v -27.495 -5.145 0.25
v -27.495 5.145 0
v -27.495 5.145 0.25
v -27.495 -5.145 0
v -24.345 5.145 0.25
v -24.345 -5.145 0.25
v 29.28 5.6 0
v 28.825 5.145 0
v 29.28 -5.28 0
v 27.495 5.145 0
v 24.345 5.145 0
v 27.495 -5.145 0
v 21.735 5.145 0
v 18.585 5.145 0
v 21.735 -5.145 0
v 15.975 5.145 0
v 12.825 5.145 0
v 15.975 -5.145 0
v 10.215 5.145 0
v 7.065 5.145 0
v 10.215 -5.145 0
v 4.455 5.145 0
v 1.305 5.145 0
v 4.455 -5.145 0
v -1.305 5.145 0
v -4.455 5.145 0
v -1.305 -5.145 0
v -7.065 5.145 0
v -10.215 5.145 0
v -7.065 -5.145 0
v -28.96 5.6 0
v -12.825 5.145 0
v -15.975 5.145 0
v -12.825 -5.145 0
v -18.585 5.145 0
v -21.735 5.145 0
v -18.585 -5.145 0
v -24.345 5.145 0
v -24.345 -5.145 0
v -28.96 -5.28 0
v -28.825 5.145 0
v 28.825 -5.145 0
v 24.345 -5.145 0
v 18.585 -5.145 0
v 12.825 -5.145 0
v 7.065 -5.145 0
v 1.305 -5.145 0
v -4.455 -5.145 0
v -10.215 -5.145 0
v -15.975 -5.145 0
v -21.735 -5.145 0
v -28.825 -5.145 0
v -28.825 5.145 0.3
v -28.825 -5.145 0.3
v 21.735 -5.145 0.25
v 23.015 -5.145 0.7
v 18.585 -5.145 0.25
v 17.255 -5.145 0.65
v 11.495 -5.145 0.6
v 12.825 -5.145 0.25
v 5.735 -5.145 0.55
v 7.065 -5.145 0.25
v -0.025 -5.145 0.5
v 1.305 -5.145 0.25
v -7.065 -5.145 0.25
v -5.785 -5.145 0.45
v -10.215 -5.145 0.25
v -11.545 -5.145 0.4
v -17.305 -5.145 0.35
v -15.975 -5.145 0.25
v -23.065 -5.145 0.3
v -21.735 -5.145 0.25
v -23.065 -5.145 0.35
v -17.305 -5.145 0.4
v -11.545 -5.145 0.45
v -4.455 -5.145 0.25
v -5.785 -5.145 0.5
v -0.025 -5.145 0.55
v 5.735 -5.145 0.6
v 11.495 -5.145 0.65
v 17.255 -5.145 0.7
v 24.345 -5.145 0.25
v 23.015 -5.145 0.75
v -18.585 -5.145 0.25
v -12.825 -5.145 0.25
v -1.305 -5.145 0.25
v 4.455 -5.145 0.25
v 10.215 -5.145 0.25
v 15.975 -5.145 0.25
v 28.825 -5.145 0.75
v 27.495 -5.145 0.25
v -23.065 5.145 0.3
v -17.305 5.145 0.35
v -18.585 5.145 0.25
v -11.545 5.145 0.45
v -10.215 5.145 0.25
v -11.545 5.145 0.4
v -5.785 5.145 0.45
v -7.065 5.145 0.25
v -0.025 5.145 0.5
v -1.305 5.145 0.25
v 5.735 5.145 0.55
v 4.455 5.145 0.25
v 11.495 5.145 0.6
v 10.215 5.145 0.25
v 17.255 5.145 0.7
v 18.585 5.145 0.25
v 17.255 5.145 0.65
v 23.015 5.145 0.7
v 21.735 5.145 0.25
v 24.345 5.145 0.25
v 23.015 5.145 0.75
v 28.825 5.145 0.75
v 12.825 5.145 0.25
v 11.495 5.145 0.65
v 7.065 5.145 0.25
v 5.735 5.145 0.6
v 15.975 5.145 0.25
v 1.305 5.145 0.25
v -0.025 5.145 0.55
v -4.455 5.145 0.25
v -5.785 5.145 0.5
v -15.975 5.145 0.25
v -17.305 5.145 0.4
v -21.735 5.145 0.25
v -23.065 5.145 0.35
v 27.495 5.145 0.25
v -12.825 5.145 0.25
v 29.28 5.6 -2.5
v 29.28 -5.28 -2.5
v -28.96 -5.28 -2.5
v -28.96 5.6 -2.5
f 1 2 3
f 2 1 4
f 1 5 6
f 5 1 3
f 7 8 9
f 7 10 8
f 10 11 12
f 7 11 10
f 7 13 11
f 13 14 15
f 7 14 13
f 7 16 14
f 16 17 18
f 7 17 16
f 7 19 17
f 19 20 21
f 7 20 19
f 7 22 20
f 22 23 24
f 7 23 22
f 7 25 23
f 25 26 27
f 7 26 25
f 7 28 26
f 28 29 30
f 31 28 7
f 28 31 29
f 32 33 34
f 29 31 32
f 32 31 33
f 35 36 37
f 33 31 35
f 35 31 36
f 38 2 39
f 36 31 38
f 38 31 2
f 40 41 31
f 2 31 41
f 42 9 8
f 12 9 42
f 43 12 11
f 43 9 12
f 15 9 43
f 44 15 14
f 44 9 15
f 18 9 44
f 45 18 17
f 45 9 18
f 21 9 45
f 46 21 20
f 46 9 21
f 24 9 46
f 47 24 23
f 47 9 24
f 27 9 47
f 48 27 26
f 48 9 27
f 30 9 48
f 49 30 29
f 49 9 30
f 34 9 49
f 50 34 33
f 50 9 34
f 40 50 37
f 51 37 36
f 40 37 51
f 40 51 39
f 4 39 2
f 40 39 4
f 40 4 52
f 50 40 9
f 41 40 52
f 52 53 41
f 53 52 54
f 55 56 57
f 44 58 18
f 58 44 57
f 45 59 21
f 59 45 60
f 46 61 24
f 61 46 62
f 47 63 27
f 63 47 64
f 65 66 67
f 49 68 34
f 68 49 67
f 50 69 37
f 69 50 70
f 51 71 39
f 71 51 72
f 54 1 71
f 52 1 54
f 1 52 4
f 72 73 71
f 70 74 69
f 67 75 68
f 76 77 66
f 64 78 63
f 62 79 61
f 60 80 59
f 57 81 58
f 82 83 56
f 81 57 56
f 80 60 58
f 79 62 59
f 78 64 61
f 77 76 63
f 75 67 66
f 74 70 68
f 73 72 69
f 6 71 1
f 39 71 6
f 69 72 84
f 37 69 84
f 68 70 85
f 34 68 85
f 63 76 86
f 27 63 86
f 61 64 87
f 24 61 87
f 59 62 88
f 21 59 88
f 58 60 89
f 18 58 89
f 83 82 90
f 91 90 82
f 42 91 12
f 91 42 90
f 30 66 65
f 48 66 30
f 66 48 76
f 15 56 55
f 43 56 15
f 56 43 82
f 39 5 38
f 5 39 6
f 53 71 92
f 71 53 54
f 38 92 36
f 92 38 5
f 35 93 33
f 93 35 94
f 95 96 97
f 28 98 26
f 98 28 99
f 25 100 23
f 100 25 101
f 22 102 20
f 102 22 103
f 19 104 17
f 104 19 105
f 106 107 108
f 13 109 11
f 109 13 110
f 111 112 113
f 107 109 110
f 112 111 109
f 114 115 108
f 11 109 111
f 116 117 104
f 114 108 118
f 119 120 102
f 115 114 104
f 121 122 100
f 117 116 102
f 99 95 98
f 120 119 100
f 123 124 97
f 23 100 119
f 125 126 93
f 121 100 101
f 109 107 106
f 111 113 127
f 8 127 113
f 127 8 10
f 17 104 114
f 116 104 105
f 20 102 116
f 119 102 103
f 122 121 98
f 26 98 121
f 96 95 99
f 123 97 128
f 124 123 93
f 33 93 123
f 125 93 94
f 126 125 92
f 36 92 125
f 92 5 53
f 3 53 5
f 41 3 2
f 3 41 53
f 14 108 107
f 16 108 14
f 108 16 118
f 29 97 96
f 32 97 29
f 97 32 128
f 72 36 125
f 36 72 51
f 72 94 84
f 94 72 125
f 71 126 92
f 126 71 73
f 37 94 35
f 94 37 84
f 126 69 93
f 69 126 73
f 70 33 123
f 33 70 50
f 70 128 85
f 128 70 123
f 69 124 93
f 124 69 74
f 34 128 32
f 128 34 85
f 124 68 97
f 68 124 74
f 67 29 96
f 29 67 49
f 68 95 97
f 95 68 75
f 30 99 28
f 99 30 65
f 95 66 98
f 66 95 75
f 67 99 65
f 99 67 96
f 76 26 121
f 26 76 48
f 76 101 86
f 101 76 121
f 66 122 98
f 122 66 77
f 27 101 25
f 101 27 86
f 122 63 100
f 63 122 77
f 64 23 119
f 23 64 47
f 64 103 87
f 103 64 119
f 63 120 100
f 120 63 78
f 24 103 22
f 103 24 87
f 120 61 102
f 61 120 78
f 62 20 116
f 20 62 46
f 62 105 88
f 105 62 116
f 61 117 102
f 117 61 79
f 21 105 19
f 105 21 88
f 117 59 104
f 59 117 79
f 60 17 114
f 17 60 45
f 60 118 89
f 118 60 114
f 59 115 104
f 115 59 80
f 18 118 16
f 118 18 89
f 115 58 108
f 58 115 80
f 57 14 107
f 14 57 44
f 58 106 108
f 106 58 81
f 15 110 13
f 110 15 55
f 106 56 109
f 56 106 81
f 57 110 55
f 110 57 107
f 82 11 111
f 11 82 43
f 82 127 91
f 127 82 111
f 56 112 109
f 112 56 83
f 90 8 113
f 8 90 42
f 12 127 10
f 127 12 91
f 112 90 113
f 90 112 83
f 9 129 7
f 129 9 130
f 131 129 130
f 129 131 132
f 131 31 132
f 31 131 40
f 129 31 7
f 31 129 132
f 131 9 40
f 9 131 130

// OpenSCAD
///////////////////////////////////////////////////////////////////////////////

// ================================
// DEBUG CONFIGURATION FLAGS
// ================================
DEBUG_MODE = true;                  // Enable comprehensive debug output
DEBUG_GEOMETRY = true;              // Log geometry calculations
DEBUG_LABELS = true;                // Log label autoscaling calculations
DEBUG_VALIDATION = true;            // Enable runtime validation checks
DEBUG_TEXT_METRICS = true;          // Log text size calculations

// ================================
// USER INPUTS - MODIFY THESE ONLY
// ================================

/* --- PRINTER SELECTION --------------------------------------------------------
   Everything dimensioned in pixels or layers follows from the machine, so pick the
   machine here rather than editing the two constants below. Add a printer by
   appending to each array and selecting its number.
   Same convention as the other generators in this project: PRINTER_NUMBER is
   1-based, so 1 is the first entry in the arrays.                                */
PRINTER_NUMBER = 2;                 // 1 = Pro 4K (65 um), 2 = Ultra (32 um)

PRINTER_NAMES              = ["Pro 4K 65um", "Ultra 32um"];
PRINTER_BUILD_PLATE_X_SIZES = [175.49, 120.76];   // [mm] exact X from the Asiga software
PRINTER_BUILD_PLATE_Y_SIZES = [ 98.75,  67.94];   // [mm] exact Y from the Asiga software
PRINTER_PIXEL_SIZES         = [ 0.065,   0.032];  // [mm/px] XY projector pixel
PRINTER_LAYER_THICKNESSES   = [ 0.020,   0.050];  // [mm/layer] slice height

// Derived -- do not edit. The devices in the paper were printed on the Ultra.
PRINTER_NAME       = PRINTER_NAMES[PRINTER_NUMBER-1];
BUILD_PLATE_X_SIZE = PRINTER_BUILD_PLATE_X_SIZES[PRINTER_NUMBER-1];
BUILD_PLATE_Y_SIZE = PRINTER_BUILD_PLATE_Y_SIZES[PRINTER_NUMBER-1];
PIXEL_SIZE         = PRINTER_PIXEL_SIZES[PRINTER_NUMBER-1];       // [mm/px]
LAYER_THICKNESS    = PRINTER_LAYER_THICKNESSES[PRINTER_NUMBER-1]; // [mm/layer]

assert(PRINTER_NUMBER >= 1 && PRINTER_NUMBER <= len(PRINTER_NAMES),
       str("PRINTER_NUMBER = ", PRINTER_NUMBER, " but only ", len(PRINTER_NAMES),
           " printers are defined (1 = ", PRINTER_NAMES[0], ", 2 = ", PRINTER_NAMES[1],
           "). Pick one of those, or append a new machine to each PRINTER_* array."));

echo(str("=== PRINTER: ", PRINTER_NAME, " === build plate ", BUILD_PLATE_X_SIZE, " x ",
         BUILD_PLATE_Y_SIZE, " mm | ", PIXEL_SIZE, " mm/px | ", LAYER_THICKNESS,
         " mm/layer"));

/* --- Array layout --- */
array_cells_x     = 10;              // [count] columns (X)
array_cells_y     = 4;              // [count] rows (Y)

/* --- Safety buffers (outer-to-outer clearances during compact packing) --- */
safety_buffer_x_pixels = 0;         // [px] horizontal buffer added between columns
safety_buffer_y_pixels = 0;         // [px] vertical buffer added between rows

// Add near top with other constants
//OVERLAP_MM = 0.002;  // [mm] tiny overlap for seamless fusion when buffer=0


/* --- Rectangular post geometry (defaults, before sweeps) --- */
DEFAULT_post_size_x_pixels = 40;     // [px] sx baseline (X width of a post)
DEFAULT_post_size_y_pixels = 40;     // [px] sy baseline (Y depth of a post)
DEFAULT_post_height_layers = 5;     // [layers] post height

/* --- Intra-cell gaps (defaults, before sweeps) --- */
DEFAULT_intra_cell_posts_gap_X_pixels = 100  ; // [px] gap between left/right post pairs (X)
DEFAULT_intra_cell_posts_gap_Y_pixels = 0; // [px] gap between bottom/top post pairs (Y)

/* --- Membrane (inner film, drawn on top of posts) --- */
DEFAULT_membrane_Z_thickness_layers = 1;   // [layers] (0 disables membranes)
// Fractional overlap into posts (0 = only void; >0 intrudes into posts)
DEFAULT_membrane_post_coverage_x  = 1;     // [fraction of sx] along X
DEFAULT_membrane_post_coverage_y  = 1;     // [fraction of sy] along Y



/* --- Two-Selector, Unit-Aware Sweeps (SWEPT) ---
   Choose any TWO labels (one per selector). Native units per label:
   
   Absolute (sets parameter directly):
     • "post_size_x"                                 [px]
     • "post_size_y"                                 [px]
     • "intra_cell_post_gap_x"                       [px] (gap between cell columns (X))
     • "intra_cell_post_gap_y"                       [px] (gap between cell rows (Y))
     • "membrane_post_coverage_x"                    [0 to 1 fraction]
     • "membrane_post_coverage_y"                    [0 to 1 fraction]
     • "membrane_thickness_layers"                   [layers]
     • "post_height_layers"                          [layers]
     • "cell_aspect_ratio_post_Z_to_cell_gap_X"      [layers/px]  (post_Z : gap_X) - 2nd swept variable must be one of the variables in this ratio to make senes, otherwise nothing will be swept over 
     • "cell_aspect_ratio_post_Z_to_cell_gap_Y"      [layers/px]  (post_Z : gap_Y) - 2nd swept variable must be one of the variables in this ratio to make senes, otherwise nothing will be swept over
   
   Coupled / scale (unitless ratio; multiplies parameters relative to their DEFAULTs):
     • "post_size_scale_both_xy"                     [fraction]
     • "intra_cell_post_gap_scale_both_xy"           [fraction]
     • "membrane_post_coverage_both_xy"              [fraction]
       (special handling: if the default coverage is 0, the scale is
        interpreted as an ABSOLUTE coverage value in [0,1])

   NEW Coupled aspect-preserving scalers (unitless ratio; multiplies DEFAULTs):
     • "post_Z_and_cell_gap_X_scale_both"            [ratio]  // scales DEFAULT_post_height_layers and DEFAULT_intra_cell_posts_gap_X_pixels together
     • "post_Z_and_cell_gap_Y_scale_both"            [ratio]  // scales DEFAULT_post_height_layers and DEFAULT_intra_cell_posts_gap_Y_pixels together

   Sweep A varies by COLUMN (cx); Sweep B varies by ROW (cy).
   If a selector is not used, set its label to "".
   If both selectors target the same label, the cell uses MAX(base, A, B).
*/
SWEPT_A_label = "membrane_thickness_layers";  // "", or any label above
SWEPT_A_min   = 1;                     // native unit of SWEPT_A_label
SWEPT_A_max   = 10;                    // native unit of SWEPT_A_label
SWEPT_A_step  = 1;                    // per-column increment

SWEPT_B_label = "post_height_layers";  // "", or any label above
SWEPT_B_min   = 5;                     // native unit of SWEPT_B_label
SWEPT_B_max   = 5;                     // native unit of SWEPT_B_label
SWEPT_B_step  = 1;                     // per-row increment

/* --- Edge Labels (optional) ---
   Right (Xmax) explains rows / Sweep B
   Top   (Ymax) explains columns / Sweep A */
enable_edge_labels           = false;                 // show labels?
edge_label_style             = "indented";             // "raised" | "indented"
edge_label_font              = "Liberation Sans";    // installed font

// AUTOSCALING: These are NOT used directly - text size is calculated automatically
edge_label_thickness_mm      = 0.2;                 // raised thickness (mm)
edge_label_indent_mm         = 0.2;                 // indent depth (mm)

// Space allocated for labels (in pixels - converted to mm internally)
label_margin_right_pixels    = 10;   // [px] space on +X (for ROW label / Sweep B)
label_margin_top_pixels      = 10;   // [px] space on +Y (for COL label / Sweep A)

// Minimum gap between array and text (safety margin)
label_safety_gap_mm          = 0.1;  // [mm] minimum gap between array and text

/* --- Base plate (optional) --- */
draw_base_plate         = true;
base_plate_thick_layers = 50;      // [layers]

// ================================
// CALCULATED VALUES - AUTO-COMPUTED
// ================================
px = PIXEL_SIZE;                           // [mm/px]
mm_buffer_x = safety_buffer_x_pixels * px; // [mm]
mm_buffer_y = safety_buffer_y_pixels * px; // [mm]

post_h_mm = DEFAULT_post_height_layers * LAYER_THICKNESS; // [mm]

label_margin_right_mm = label_margin_right_pixels * px;
label_margin_top_mm   = label_margin_top_pixels * px;

// Echo all calculated base values for debugging
echo("======== CALCULATED BASE VALUES ========");
echo("px (mm/pixel):", px);
echo("mm_buffer_x:", mm_buffer_x, "mm");
echo("mm_buffer_y:", mm_buffer_y, "mm");
echo("post_h_mm:", post_h_mm, "mm");
echo("label_margin_right_mm:", label_margin_right_mm, "mm");
echo("label_margin_top_mm:", label_margin_top_mm, "mm");

// Replace the OVERLAP_MM line with:
OVERLAP_MM = LAYER_THICKNESS;  // Use one layer thickness - guaranteed to merge properly

// And simplify the overlap logic - apply to the SIZE only, not position:
overlap_x = (safety_buffer_x_pixels == 0) ? OVERLAP_MM : 0;
overlap_y = (safety_buffer_y_pixels == 0) ? OVERLAP_MM : 0;
// ================================
// HELPER FUNCTIONS WITH VALIDATION
// ================================

function clamp(x, lo, hi) = min(max(x, lo), hi);

// Robust max over a list (OpenSCAD 2021.01 compatible — no slicing)
function list_max(v) = list_max_i(v, 0);
function list_max_i(v, i) =
    (len(v) == 0)            ? 0 :                 // define a value for empty lists
    (i >= len(v) - 1)        ? v[i] :              // last element -> return it
                               max(v[i], list_max_i(v, i + 1));


// base value for a label, in its native unit
function base_value_for_label(label) =
    label == "post_size_x"                                 ? DEFAULT_post_size_x_pixels :
    label == "post_size_y"                                 ? DEFAULT_post_size_y_pixels :
    label == "intra_cell_post_gap_x"                       ? DEFAULT_intra_cell_posts_gap_X_pixels :
    label == "intra_cell_post_gap_y"                       ? DEFAULT_intra_cell_posts_gap_Y_pixels :
    label == "membrane_post_coverage_x"                    ? DEFAULT_membrane_post_coverage_x :
    label == "membrane_post_coverage_y"                    ? DEFAULT_membrane_post_coverage_y :
    label == "membrane_thickness_layers"                   ? DEFAULT_membrane_Z_thickness_layers :
    label == "post_height_layers"                          ? DEFAULT_post_height_layers :
    // NEW aspect-ratio sweep labels default to 1 (layers/px)
    label == "cell_aspect_ratio_post_Z_to_cell_gap_X"      ? 0 :
    label == "cell_aspect_ratio_post_Z_to_cell_gap_Y"      ? 0 :
    // Existing scalers (unitless)
    label == "post_size_scale_both_xy"                     ? 1 :    // ratio
    label == "intra_cell_post_gap_scale_both_xy"           ? 1 :    // ratio
    // NEW coupled aspect-preserving scalers (unitless, multiply DEFAULTs)
    label == "post_Z_and_cell_gap_X_scale_both"            ? 1 :
    label == "post_Z_and_cell_gap_Y_scale_both"            ? 1 :
    // IMPORTANT: scale default 0 so it doesn't force ≥1 coverage
    label == "membrane_post_coverage_both_xy"              ? 0 : // ratio (0 means "no scaling" when base==0)
    0;

// sweep values in native units
function SWEPT_A_value_at(cx) =
    clamp(SWEPT_A_min + cx*SWEPT_A_step, min(SWEPT_A_min,SWEPT_A_max), max(SWEPT_A_min,SWEPT_A_max));
function SWEPT_B_value_at(cy) =
    clamp(SWEPT_B_min + cy*SWEPT_B_step, min(SWEPT_B_min,SWEPT_B_max), max(SWEPT_B_min,SWEPT_B_max));

// final (native-unit) value for a label at a cell, using MAX(base, A?, B?)
function value_for_label_at_cell(label, cx, cy) =
    let(base = base_value_for_label(label),
        a    = (SWEPT_A_label == label) ? SWEPT_A_value_at(cx) : base,
        b    = (SWEPT_B_label == label) ? SWEPT_B_value_at(cy) : base)
    max(base, a, b);

// Coupled scale factors (unitless ratios)
function size_scale_at(cx,cy)   = value_for_label_at_cell("post_size_scale_both_xy", cx, cy);
function gap_scale_at(cx,cy)    = value_for_label_at_cell("intra_cell_post_gap_scale_both_xy", cx, cy);

// NEW: aspect-preserving coupled scalers (unitless ratios; multiply DEFAULTs)
function z_gapX_coupled_scale_at(cx,cy) = value_for_label_at_cell("post_Z_and_cell_gap_X_scale_both", cx, cy);
function z_gapY_coupled_scale_at(cx,cy) = value_for_label_at_cell("post_Z_and_cell_gap_Y_scale_both", cx, cy);

// Coverage scale handling:
// If base coverage is zero, treat scale as ABSOLUTE coverage in [0,1].
// Else, multiply the base by scale. Always clamp to [0,1].
function cov_scaled_candidate(cx, cy, base_cov) =
    let(scale = value_for_label_at_cell("membrane_post_coverage_both_xy", cx, cy))
    min(1, max(0, base_cov > 0 ? base_cov * scale : scale));

/* ---- Resolve concrete parameters at (cx,cy) ---- */

// Absolute candidates (native units)
function sx_abs_px_at(cx,cy)    = value_for_label_at_cell("post_size_x", cx, cy);
function sy_abs_px_at(cx,cy)    = value_for_label_at_cell("post_size_y", cx, cy);
function gx_abs_px_at(cx,cy)    = value_for_label_at_cell("intra_cell_post_gap_x", cx, cy);
function gy_abs_px_at(cx,cy)    = value_for_label_at_cell("intra_cell_post_gap_y", cx, cy);
function covx_abs_at(cx,cy)     = value_for_label_at_cell("membrane_post_coverage_x", cx, cy);
function covy_abs_at(cx,cy)     = value_for_label_at_cell("membrane_post_coverage_y", cx, cy);
function mem_layers_at(cx,cy)   = value_for_label_at_cell("membrane_thickness_layers", cx, cy);

/* ======== COUPLED Z+GAP SCALE LOGIC (Option A: relative to DEFAULTs) ======== */
// These scales multiply the DEFAULT values of post height (layers) and the corresponding gap (pixels),
// and are then merged with other sources via MAX (so they never reduce a value).

function post_layers_at(cx,cy) =
    let(
        base_layers = value_for_label_at_cell("post_height_layers", cx, cy),
        ratioX_AR   = value_for_label_at_cell("cell_aspect_ratio_post_Z_to_cell_gap_X", cx, cy),
        ratioY_AR   = value_for_label_at_cell("cell_aspect_ratio_post_Z_to_cell_gap_Y", cx, cy),
        // Aspect-based derived heights (layers) if those AR labels are used
        derivedX_AR = (ratioX_AR > 0) ? ratioX_AR * gx_px_at(cx,cy) : 0,
        derivedY_AR = (ratioY_AR > 0) ? ratioY_AR * gy_px_at(cx,cy) : 0,
        // NEW coupled scalers relative to DEFAULTs
        z_gapX_scale = z_gapX_coupled_scale_at(cx,cy),
        z_gapY_scale = z_gapY_coupled_scale_at(cx,cy),
        derivedX_coupled = DEFAULT_post_height_layers * z_gapX_scale,
        derivedY_coupled = DEFAULT_post_height_layers * z_gapY_scale
    )
    max(base_layers, derivedX_AR, derivedY_AR, derivedX_coupled, derivedY_coupled);

// Combine with coupled scales: MAX(DEFAULT, absolute, existing scaler, NEW coupled scaler)
function sx_px_at(cx,cy) =
    max(DEFAULT_post_size_x_pixels,
        max(sx_abs_px_at(cx,cy), DEFAULT_post_size_x_pixels * size_scale_at(cx,cy)));

function sy_px_at(cx,cy) =
    max(DEFAULT_post_size_y_pixels,
        max(sy_abs_px_at(cx,cy), DEFAULT_post_size_y_pixels * size_scale_at(cx,cy)));

function gx_px_at(cx,cy) =
    let(coupled = DEFAULT_intra_cell_posts_gap_X_pixels * z_gapX_coupled_scale_at(cx,cy))
    max(DEFAULT_intra_cell_posts_gap_X_pixels,
        max(gx_abs_px_at(cx,cy),
            max(DEFAULT_intra_cell_posts_gap_X_pixels * gap_scale_at(cx,cy), coupled)));

function gy_px_at(cx,cy) =
    let(coupled = DEFAULT_intra_cell_posts_gap_Y_pixels * z_gapY_coupled_scale_at(cx,cy))
    max(DEFAULT_intra_cell_posts_gap_Y_pixels,
        max(gy_abs_px_at(cx,cy),
            max(DEFAULT_intra_cell_posts_gap_Y_pixels * gap_scale_at(cx,cy), coupled)));

function covx_at(cx,cy) =
    clamp(max(covx_abs_at(cx,cy), cov_scaled_candidate(cx,cy,DEFAULT_membrane_post_coverage_x)), 0, 1);
function covy_at(cx,cy) =
    clamp(max(covy_abs_at(cx,cy), cov_scaled_candidate(cx,cy,DEFAULT_membrane_post_coverage_y)), 0, 1);

// All in [mm]
function sx_mm_at(cx,cy)       = sx_px_at(cx,cy) * px;
function sy_mm_at(cx,cy)       = sy_px_at(cx,cy) * px;
function gx_mm_at(cx,cy)       = gx_px_at(cx,cy) * px;
function gy_mm_at(cx,cy)       = gy_px_at(cx,cy) * px;
function mem_thk_mm_at(cx,cy)  = mem_layers_at(cx,cy)  * LAYER_THICKNESS;
function post_h_mm_at(cx,cy)   = post_layers_at(cx,cy) * LAYER_THICKNESS;

// ================================
// COMPACT PACKING WITH DEBUG OUTPUT (FIXED)
// ================================

// Worst-case band for a given column, scanning all rows
function col_band_xmm(cx) =
    let(
        sx_list = [for (cy=[0:array_cells_y-1]) sx_mm_at(cx,cy)],
        gx_list = [for (cy=[0:array_cells_y-1]) gx_mm_at(cx,cy)],
        max_sx  = list_max(sx_list),
        max_gx  = list_max(gx_list)
    )
    2*max_sx + max_gx + mm_buffer_x;

// Worst-case band for a given row, scanning all columns
function row_band_ymm(cy) =
    let(
        sy_list = [for (cx=[0:array_cells_x-1]) sy_mm_at(cx,cy)],
        gy_list = [for (cx=[0:array_cells_x-1]) gy_mm_at(cx,cy)],
        max_sy  = list_max(sy_list),
        max_gy  = list_max(gy_list)
    )
    2*max_sy + max_gy + mm_buffer_y;

// Build band arrays using the worst-case evaluators above
function build_column_bands_xmm(cx=0, accum=[]) =
    cx >= array_cells_x ? accum :
    build_column_bands_xmm(cx+1, concat(accum, [col_band_xmm(cx)]));

function build_row_bands_ymm(cy=0, accum=[]) =
    cy >= array_cells_y ? accum :
    build_row_bands_ymm(cy+1, concat(accum, [row_band_ymm(cy)]));

// Compute cumulative centers for compact placement
function build_column_centers_xmm(bands, cx=0, start=0, accum=[]) =
    cx >= len(bands) ? accum :
    let(ctr = start + bands[cx]/2)
    build_column_centers_xmm(bands, cx+1, start+bands[cx], concat(accum, [ctr]));

function build_row_centers_ymm(bands, cy=0, start=0, accum=[]) =
    cy >= len(bands) ? accum :
    let(ctr = start + bands[cy]/2)
    build_row_centers_ymm(bands, cy+1, start+bands[cy], concat(accum, [ctr]));

column_bands_xmm   = build_column_bands_xmm();
row_bands_ymm      = build_row_bands_ymm();
column_centers_xmm = build_column_centers_xmm(column_bands_xmm);
row_centers_ymm    = build_row_centers_ymm(row_bands_ymm);

total_array_width  = column_centers_xmm[len(column_centers_xmm)-1] + column_bands_xmm[len(column_bands_xmm)-1]/2;
total_array_height = row_centers_ymm[len(row_centers_ymm)-1]       + row_bands_ymm[len(row_bands_ymm)-1]/2;

echo("======== ARRAY DIMENSIONS ========");
echo("Total array width:", total_array_width, "mm");
echo("Total array height:", total_array_height, "mm");

// ================================
// LABEL TEXT GENERATION (with increments)
// ================================

// Short human-friendly names
function pretty_label_short(lbl) =
    lbl == "post_size_x"                                 ? "post_x" :
    lbl == "post_size_y"                                 ? "post_y" :
    lbl == "intra_cell_post_gap_x"                       ? "intra_cell_post_gap_x" :
    lbl == "intra_cell_post_gap_y"                       ? "intra_cell_post_gap_y" :
    lbl == "membrane_post_coverage_x"                    ? "cov_x" :
    lbl == "membrane_post_coverage_y"                    ? "cov_y" :
    lbl == "membrane_thickness_layers"                   ? "mem_thick_layrs" :
    lbl == "post_height_layers"                          ? "post_height_layers" :
    lbl == "cell_aspect_ratio_post_Z_to_cell_gap_X"      ? "AR(Z:gapX)" :
    lbl == "cell_aspect_ratio_post_Z_to_cell_gap_Y"      ? "AR(Z:gapY)" :
    lbl == "post_size_scale_both_xy"                     ? "post_scale_xy" :
    lbl == "intra_cell_post_gap_scale_both_xy"           ? "gap_scale_xy" :
    lbl == "post_Z_and_cell_gap_X_scale_both"            ? "Z&gapX_scale" :
    lbl == "post_Z_and_cell_gap_Y_scale_both"            ? "Z&gapY_scale" :
    lbl == "membrane_post_coverage_both_xy"              ? "cov_scale_xy" :
    lbl == ""                                            ? "—" : lbl;

// One-liner with min → max (+ step)
function sweep_line_short(which) =
    which == "A"
      ? str(pretty_label_short(SWEPT_A_label), " (",
            SWEPT_A_min, ":", SWEPT_A_step,":", SWEPT_A_max,")")
      : str(pretty_label_short(SWEPT_B_label), " (",
            SWEPT_B_min, ":", SWEPT_B_step,":", SWEPT_B_max,")");

// Text strings that will actually be printed on the part
text_right = sweep_line_short("B");  // vertical on +X side
text_top   = sweep_line_short("A");  // horizontal on +Y side

// ================================
// AUTOSCALING (independent per side, consistent math)
// ================================

// Character width model: avg glyph width ≈ char_width_factor * text_height
char_width_factor = 0.6;

// How much of the array edge length we allow labels to occupy (0..1)
length_allowance  = 0.90;

// Safety gap already reduces usable margin; no extra shrink applied here
avail_margin_right_mm = max(0, label_margin_right_mm - label_safety_gap_mm);
avail_margin_top_mm   = max(0, label_margin_top_mm   - label_safety_gap_mm);

// Length allowances along array edges
avail_len_right_mm = total_array_height * length_allowance; // vertical run
avail_len_top_mm   = total_array_width  * length_allowance; // horizontal run

// Height required to satisfy text LENGTH (for each side)
function height_needed_for_length(text_str, avail_len_mm) =
    len(text_str) > 0
      ? avail_len_mm / (len(text_str) * char_width_factor)
      : 0;

// Per-side candidate heights from length constraint
height_len_right_mm = height_needed_for_length(text_right, avail_len_right_mm);
height_len_top_mm   = height_needed_for_length(text_top,   avail_len_top_mm);

// Per-side caps from margin thickness (font height cannot exceed margin thickness)
cap_right_mm = avail_margin_right_mm;
cap_top_mm   = avail_margin_top_mm;

// Final per-side font sizes (independent)
actual_label_size_right_mm = min(height_len_right_mm, cap_right_mm);
actual_label_size_top_mm   = min(height_len_top_mm,   cap_top_mm);

// Estimated printed lengths with the chosen sizes (diagnostics)
function estimated_text_length(text_str, text_h_mm) =
    len(text_str) * text_h_mm * char_width_factor;

actual_right_text_length_mm = estimated_text_length(text_right, actual_label_size_right_mm);
actual_top_text_length_mm   = estimated_text_length(text_top,   actual_label_size_top_mm);

// Debug echoes
echo("======== LABEL AUTOSCALING (REWRITE) ========");
echo("Right label:", text_right, " (", len(text_right), " chars)");
echo("Top   label:", text_top,   " (", len(text_top),   " chars)");
echo("Margins usable: right=", avail_margin_right_mm, "mm, top=", avail_margin_top_mm, "mm");
echo("Edge length allowances: right=", avail_len_right_mm, "mm, top=", avail_len_top_mm, "mm");
echo("Heights from length: right=", height_len_right_mm, "mm, top=", height_len_top_mm, "mm");
echo("Final font sizes: right=", actual_label_size_right_mm, "mm, top=", actual_label_size_top_mm, "mm");
echo("Resulting text lengths: right=", actual_right_text_length_mm, "mm (<= ", avail_len_right_mm, ")",
                                  ", top=",   actual_top_text_length_mm,   "mm (<= ", avail_len_top_mm,   ")");
echo("Fits: right=", (actual_right_text_length_mm <= avail_len_right_mm) && (actual_label_size_right_mm <= cap_right_mm),
           ", top=", (actual_top_text_length_mm   <= avail_len_top_mm)   && (actual_label_size_top_mm   <= cap_top_mm));

// ================================
// GEOMETRY MODULES
// ================================

// ================================
// EDGE LABELS (use per-side sizes)
// ================================
module edge_labels_solid(style) {
    if (enable_edge_labels) {
        if (DEBUG_LABELS) {
            echo("Creating edge labels (", style, ")");
            echo("Right font size:", actual_label_size_right_mm,
                 " Top font size:", actual_label_size_top_mm);
        }

        h = (style == "raised") ? edge_label_thickness_mm : edge_label_indent_mm;

        // Right side (+X): vertical text for Sweep B
        translate([ total_array_width/2 + label_margin_right_mm, 0, 0 ])
        rotate([0,0,90])
        linear_extrude(height = h)
            text(text_right,
                 size   = actual_label_size_right_mm,
                 font   = edge_label_font,
                 halign = "center",
                 valign = "bottom");

        // Top side (+Y): horizontal text for Sweep A
        translate([ 0, total_array_height/2 + label_margin_top_mm/2, 0 ])
        linear_extrude(height = h)
            text(text_top,
                 size   = actual_label_size_top_mm,
                 font   = edge_label_font,
                 halign = "center",
                 valign = "bottom");
    }
}

module microcell_at(cx, cy, col_center_x_mm, row_center_y_mm) {
    // Base sizes from functions (no overlap yet)
    sx_base = sx_mm_at(cx,cy);
    sy_base = sy_mm_at(cx,cy);
    gx = gx_mm_at(cx,cy);
    gy = gy_mm_at(cx,cy);

    covx = covx_at(cx,cy);
    covy = covy_at(cx,cy);
    mem_thk = mem_thk_mm_at(cx,cy);
    post_h  = post_h_mm_at(cx,cy);

    // Offsets calculated from BASE sizes (positions don't change)
    off_x = sx_base/2 + gx/2;
    off_y = sy_base/2 + gy/2;

    // Actual drawn sizes (WITH overlap for fusion)
    sx = sx_base + overlap_x;
    sy = sy_base + overlap_y;

    // Membrane dimensions (with overlap)
    mem_z = (mem_thk > 0) ? (post_h + mem_thk/2) : 0;
    mem_w = 2*(off_x - sx_base/2 + covx * sx_base) + overlap_x;
    mem_h = 2*(off_y - sy_base/2 + covy * sy_base) + overlap_y;

    translate([col_center_x_mm, row_center_y_mm, 0]) {
        // Four posts - positions unchanged, sizes include overlap
        translate([-off_x, -off_y, post_h/2]) cube([sx, sy, post_h], center=true);
        translate([+off_x, -off_y, post_h/2]) cube([sx, sy, post_h], center=true);
        translate([-off_x, +off_y, post_h/2]) cube([sx, sy, post_h], center=true);
        translate([+off_x, +off_y, post_h/2]) cube([sx, sy, post_h], center=true);

        if (mem_thk > 0 && mem_w > 0 && mem_h > 0) {
            color("lightblue", 0.6)
            translate([0, 0, mem_z]) cube([mem_w, mem_h, mem_thk], center=true);
        }
    }
}

// Use ONLY the original array module - remove continuous_column_strip entirely
module microarray_compact() {
    cx_offset = total_array_width / 2;
    cy_offset = total_array_height / 2;

    if (DEBUG_MODE) echo("Building microarray with", array_cells_x, "×", array_cells_y, "cells");

    for (cx=[0:array_cells_x-1]) {
        col_x_world = column_centers_xmm[cx] - cx_offset;
        for (cy=[0:array_cells_y-1]) {
            row_y_world = row_centers_ymm[cy] - cy_offset;
            microcell_at(cx, cy, col_x_world, row_y_world);
        }
    }
}
// ================================
// ARRAY ASSEMBLY MODULE
// ================================
module microarray_compact() {
    cx_offset = total_array_width / 2;
    cy_offset = total_array_height / 2;

    if (DEBUG_MODE) echo("Building microarray with", array_cells_x, "×", array_cells_y, "cells");

    for (cx=[0:array_cells_x-1]) {
        col_x_world = column_centers_xmm[cx] - cx_offset;
        for (cy=[0:array_cells_y-1]) {
            row_y_world = row_centers_ymm[cy] - cy_offset;
            microcell_at(cx, cy, col_x_world, row_y_world);
        }
    }
}

// ================================
// BASE PLATE MODULE (optional)
// ================================
module base_plate() {
    base_thk = base_plate_thick_layers * LAYER_THICKNESS;

    // Base plate extends to include label margins
    bx = total_array_width  + label_margin_right_mm * 2;
    by = total_array_height + label_margin_top_mm * 2;

    if (DEBUG_MODE) {
        echo("======== BASE PLATE ========");
        echo("Base plate dimensions: X=", bx, "mm, Y=", by, "mm, Z=", base_thk, "mm");
        echo("Base plate enabled:", draw_base_plate);
        echo("Base extends beyond array by: X=", label_margin_right_mm, "mm, Y=", label_margin_top_mm, "mm");
    }

    if (draw_base_plate) {
        if (enable_edge_labels && edge_label_style == "indented") {
            difference() {
                translate([label_margin_right_mm/2, label_margin_top_mm/2, -base_thk/2]) 
                color("gray", 0.5)
                    cube([bx, by, base_thk], center=true);
                translate([0,0,-edge_label_indent_mm])
                    edge_labels_solid("indented");
            }
        } else {
            translate([label_margin_right_mm/2, label_margin_top_mm/2, -base_thk/2]) 
            color("gray", 0.5)
                cube([bx, by, base_thk], center=true);
        }
    }
}

// ================================
// MAIN ASSEMBLY WITH SINGLE TOP-LEVEL UNION
// ================================
$fn = 32;

union() {
    base_plate(); // slab first
    if (enable_edge_labels && edge_label_style == "raised") {
        edge_labels_solid("raised");
    }
    microarray_compact(); // all microcells
}

// ================================
// VALIDATION AND SUMMARY OUTPUT
// ================================
echo("======== ARRAY SUMMARY ========");
echo("Cells: ", array_cells_x, " × ", array_cells_y);
echo("Total size (mm): X=", total_array_width, " Y=", total_array_height);
echo("Sweeps:");
echo(" A (by columns): label=", SWEPT_A_label, " min=", SWEPT_A_min, " max=", SWEPT_A_max, " step=", SWEPT_A_step);
echo(" B (by rows): label=", SWEPT_B_label, " min=", SWEPT_B_min, " max=", SWEPT_B_max, " step=", SWEPT_B_step);
echo("Safety buffers: X=", safety_buffer_x_pixels, " px (", mm_buffer_x, " mm)", " Y=", safety_buffer_y_pixels, " px (", mm_buffer_y, " mm)");
echo("Label texts: Right='", text_right, "', Top='", text_top, "'");

assert(array_cells_x > 0, "ERROR: array_cells_x must be positive");
assert(array_cells_y > 0, "ERROR: array_cells_y must be positive");
assert(PIXEL_SIZE > 0, "ERROR: PIXEL_SIZE must be positive");
assert(LAYER_THICKNESS > 0, "ERROR: LAYER_THICKNESS must be positive");
assert(total_array_width > 0, "ERROR: Calculated array width is invalid");
assert(total_array_height > 0, "ERROR: Calculated array height is invalid");

echo("======== VALIDATION COMPLETE ========");
echo("All parameter validation checks passed successfully");
echo("Label autoscaling: right text height = ", actual_label_size_right_mm,
                 " mm; top text height = ",   actual_label_size_top_mm,   " mm");
echo("Labels positioned OUTSIDE array bounds with ",
     label_safety_gap_mm, " mm safety gap");
echo("Ready for rendering");
